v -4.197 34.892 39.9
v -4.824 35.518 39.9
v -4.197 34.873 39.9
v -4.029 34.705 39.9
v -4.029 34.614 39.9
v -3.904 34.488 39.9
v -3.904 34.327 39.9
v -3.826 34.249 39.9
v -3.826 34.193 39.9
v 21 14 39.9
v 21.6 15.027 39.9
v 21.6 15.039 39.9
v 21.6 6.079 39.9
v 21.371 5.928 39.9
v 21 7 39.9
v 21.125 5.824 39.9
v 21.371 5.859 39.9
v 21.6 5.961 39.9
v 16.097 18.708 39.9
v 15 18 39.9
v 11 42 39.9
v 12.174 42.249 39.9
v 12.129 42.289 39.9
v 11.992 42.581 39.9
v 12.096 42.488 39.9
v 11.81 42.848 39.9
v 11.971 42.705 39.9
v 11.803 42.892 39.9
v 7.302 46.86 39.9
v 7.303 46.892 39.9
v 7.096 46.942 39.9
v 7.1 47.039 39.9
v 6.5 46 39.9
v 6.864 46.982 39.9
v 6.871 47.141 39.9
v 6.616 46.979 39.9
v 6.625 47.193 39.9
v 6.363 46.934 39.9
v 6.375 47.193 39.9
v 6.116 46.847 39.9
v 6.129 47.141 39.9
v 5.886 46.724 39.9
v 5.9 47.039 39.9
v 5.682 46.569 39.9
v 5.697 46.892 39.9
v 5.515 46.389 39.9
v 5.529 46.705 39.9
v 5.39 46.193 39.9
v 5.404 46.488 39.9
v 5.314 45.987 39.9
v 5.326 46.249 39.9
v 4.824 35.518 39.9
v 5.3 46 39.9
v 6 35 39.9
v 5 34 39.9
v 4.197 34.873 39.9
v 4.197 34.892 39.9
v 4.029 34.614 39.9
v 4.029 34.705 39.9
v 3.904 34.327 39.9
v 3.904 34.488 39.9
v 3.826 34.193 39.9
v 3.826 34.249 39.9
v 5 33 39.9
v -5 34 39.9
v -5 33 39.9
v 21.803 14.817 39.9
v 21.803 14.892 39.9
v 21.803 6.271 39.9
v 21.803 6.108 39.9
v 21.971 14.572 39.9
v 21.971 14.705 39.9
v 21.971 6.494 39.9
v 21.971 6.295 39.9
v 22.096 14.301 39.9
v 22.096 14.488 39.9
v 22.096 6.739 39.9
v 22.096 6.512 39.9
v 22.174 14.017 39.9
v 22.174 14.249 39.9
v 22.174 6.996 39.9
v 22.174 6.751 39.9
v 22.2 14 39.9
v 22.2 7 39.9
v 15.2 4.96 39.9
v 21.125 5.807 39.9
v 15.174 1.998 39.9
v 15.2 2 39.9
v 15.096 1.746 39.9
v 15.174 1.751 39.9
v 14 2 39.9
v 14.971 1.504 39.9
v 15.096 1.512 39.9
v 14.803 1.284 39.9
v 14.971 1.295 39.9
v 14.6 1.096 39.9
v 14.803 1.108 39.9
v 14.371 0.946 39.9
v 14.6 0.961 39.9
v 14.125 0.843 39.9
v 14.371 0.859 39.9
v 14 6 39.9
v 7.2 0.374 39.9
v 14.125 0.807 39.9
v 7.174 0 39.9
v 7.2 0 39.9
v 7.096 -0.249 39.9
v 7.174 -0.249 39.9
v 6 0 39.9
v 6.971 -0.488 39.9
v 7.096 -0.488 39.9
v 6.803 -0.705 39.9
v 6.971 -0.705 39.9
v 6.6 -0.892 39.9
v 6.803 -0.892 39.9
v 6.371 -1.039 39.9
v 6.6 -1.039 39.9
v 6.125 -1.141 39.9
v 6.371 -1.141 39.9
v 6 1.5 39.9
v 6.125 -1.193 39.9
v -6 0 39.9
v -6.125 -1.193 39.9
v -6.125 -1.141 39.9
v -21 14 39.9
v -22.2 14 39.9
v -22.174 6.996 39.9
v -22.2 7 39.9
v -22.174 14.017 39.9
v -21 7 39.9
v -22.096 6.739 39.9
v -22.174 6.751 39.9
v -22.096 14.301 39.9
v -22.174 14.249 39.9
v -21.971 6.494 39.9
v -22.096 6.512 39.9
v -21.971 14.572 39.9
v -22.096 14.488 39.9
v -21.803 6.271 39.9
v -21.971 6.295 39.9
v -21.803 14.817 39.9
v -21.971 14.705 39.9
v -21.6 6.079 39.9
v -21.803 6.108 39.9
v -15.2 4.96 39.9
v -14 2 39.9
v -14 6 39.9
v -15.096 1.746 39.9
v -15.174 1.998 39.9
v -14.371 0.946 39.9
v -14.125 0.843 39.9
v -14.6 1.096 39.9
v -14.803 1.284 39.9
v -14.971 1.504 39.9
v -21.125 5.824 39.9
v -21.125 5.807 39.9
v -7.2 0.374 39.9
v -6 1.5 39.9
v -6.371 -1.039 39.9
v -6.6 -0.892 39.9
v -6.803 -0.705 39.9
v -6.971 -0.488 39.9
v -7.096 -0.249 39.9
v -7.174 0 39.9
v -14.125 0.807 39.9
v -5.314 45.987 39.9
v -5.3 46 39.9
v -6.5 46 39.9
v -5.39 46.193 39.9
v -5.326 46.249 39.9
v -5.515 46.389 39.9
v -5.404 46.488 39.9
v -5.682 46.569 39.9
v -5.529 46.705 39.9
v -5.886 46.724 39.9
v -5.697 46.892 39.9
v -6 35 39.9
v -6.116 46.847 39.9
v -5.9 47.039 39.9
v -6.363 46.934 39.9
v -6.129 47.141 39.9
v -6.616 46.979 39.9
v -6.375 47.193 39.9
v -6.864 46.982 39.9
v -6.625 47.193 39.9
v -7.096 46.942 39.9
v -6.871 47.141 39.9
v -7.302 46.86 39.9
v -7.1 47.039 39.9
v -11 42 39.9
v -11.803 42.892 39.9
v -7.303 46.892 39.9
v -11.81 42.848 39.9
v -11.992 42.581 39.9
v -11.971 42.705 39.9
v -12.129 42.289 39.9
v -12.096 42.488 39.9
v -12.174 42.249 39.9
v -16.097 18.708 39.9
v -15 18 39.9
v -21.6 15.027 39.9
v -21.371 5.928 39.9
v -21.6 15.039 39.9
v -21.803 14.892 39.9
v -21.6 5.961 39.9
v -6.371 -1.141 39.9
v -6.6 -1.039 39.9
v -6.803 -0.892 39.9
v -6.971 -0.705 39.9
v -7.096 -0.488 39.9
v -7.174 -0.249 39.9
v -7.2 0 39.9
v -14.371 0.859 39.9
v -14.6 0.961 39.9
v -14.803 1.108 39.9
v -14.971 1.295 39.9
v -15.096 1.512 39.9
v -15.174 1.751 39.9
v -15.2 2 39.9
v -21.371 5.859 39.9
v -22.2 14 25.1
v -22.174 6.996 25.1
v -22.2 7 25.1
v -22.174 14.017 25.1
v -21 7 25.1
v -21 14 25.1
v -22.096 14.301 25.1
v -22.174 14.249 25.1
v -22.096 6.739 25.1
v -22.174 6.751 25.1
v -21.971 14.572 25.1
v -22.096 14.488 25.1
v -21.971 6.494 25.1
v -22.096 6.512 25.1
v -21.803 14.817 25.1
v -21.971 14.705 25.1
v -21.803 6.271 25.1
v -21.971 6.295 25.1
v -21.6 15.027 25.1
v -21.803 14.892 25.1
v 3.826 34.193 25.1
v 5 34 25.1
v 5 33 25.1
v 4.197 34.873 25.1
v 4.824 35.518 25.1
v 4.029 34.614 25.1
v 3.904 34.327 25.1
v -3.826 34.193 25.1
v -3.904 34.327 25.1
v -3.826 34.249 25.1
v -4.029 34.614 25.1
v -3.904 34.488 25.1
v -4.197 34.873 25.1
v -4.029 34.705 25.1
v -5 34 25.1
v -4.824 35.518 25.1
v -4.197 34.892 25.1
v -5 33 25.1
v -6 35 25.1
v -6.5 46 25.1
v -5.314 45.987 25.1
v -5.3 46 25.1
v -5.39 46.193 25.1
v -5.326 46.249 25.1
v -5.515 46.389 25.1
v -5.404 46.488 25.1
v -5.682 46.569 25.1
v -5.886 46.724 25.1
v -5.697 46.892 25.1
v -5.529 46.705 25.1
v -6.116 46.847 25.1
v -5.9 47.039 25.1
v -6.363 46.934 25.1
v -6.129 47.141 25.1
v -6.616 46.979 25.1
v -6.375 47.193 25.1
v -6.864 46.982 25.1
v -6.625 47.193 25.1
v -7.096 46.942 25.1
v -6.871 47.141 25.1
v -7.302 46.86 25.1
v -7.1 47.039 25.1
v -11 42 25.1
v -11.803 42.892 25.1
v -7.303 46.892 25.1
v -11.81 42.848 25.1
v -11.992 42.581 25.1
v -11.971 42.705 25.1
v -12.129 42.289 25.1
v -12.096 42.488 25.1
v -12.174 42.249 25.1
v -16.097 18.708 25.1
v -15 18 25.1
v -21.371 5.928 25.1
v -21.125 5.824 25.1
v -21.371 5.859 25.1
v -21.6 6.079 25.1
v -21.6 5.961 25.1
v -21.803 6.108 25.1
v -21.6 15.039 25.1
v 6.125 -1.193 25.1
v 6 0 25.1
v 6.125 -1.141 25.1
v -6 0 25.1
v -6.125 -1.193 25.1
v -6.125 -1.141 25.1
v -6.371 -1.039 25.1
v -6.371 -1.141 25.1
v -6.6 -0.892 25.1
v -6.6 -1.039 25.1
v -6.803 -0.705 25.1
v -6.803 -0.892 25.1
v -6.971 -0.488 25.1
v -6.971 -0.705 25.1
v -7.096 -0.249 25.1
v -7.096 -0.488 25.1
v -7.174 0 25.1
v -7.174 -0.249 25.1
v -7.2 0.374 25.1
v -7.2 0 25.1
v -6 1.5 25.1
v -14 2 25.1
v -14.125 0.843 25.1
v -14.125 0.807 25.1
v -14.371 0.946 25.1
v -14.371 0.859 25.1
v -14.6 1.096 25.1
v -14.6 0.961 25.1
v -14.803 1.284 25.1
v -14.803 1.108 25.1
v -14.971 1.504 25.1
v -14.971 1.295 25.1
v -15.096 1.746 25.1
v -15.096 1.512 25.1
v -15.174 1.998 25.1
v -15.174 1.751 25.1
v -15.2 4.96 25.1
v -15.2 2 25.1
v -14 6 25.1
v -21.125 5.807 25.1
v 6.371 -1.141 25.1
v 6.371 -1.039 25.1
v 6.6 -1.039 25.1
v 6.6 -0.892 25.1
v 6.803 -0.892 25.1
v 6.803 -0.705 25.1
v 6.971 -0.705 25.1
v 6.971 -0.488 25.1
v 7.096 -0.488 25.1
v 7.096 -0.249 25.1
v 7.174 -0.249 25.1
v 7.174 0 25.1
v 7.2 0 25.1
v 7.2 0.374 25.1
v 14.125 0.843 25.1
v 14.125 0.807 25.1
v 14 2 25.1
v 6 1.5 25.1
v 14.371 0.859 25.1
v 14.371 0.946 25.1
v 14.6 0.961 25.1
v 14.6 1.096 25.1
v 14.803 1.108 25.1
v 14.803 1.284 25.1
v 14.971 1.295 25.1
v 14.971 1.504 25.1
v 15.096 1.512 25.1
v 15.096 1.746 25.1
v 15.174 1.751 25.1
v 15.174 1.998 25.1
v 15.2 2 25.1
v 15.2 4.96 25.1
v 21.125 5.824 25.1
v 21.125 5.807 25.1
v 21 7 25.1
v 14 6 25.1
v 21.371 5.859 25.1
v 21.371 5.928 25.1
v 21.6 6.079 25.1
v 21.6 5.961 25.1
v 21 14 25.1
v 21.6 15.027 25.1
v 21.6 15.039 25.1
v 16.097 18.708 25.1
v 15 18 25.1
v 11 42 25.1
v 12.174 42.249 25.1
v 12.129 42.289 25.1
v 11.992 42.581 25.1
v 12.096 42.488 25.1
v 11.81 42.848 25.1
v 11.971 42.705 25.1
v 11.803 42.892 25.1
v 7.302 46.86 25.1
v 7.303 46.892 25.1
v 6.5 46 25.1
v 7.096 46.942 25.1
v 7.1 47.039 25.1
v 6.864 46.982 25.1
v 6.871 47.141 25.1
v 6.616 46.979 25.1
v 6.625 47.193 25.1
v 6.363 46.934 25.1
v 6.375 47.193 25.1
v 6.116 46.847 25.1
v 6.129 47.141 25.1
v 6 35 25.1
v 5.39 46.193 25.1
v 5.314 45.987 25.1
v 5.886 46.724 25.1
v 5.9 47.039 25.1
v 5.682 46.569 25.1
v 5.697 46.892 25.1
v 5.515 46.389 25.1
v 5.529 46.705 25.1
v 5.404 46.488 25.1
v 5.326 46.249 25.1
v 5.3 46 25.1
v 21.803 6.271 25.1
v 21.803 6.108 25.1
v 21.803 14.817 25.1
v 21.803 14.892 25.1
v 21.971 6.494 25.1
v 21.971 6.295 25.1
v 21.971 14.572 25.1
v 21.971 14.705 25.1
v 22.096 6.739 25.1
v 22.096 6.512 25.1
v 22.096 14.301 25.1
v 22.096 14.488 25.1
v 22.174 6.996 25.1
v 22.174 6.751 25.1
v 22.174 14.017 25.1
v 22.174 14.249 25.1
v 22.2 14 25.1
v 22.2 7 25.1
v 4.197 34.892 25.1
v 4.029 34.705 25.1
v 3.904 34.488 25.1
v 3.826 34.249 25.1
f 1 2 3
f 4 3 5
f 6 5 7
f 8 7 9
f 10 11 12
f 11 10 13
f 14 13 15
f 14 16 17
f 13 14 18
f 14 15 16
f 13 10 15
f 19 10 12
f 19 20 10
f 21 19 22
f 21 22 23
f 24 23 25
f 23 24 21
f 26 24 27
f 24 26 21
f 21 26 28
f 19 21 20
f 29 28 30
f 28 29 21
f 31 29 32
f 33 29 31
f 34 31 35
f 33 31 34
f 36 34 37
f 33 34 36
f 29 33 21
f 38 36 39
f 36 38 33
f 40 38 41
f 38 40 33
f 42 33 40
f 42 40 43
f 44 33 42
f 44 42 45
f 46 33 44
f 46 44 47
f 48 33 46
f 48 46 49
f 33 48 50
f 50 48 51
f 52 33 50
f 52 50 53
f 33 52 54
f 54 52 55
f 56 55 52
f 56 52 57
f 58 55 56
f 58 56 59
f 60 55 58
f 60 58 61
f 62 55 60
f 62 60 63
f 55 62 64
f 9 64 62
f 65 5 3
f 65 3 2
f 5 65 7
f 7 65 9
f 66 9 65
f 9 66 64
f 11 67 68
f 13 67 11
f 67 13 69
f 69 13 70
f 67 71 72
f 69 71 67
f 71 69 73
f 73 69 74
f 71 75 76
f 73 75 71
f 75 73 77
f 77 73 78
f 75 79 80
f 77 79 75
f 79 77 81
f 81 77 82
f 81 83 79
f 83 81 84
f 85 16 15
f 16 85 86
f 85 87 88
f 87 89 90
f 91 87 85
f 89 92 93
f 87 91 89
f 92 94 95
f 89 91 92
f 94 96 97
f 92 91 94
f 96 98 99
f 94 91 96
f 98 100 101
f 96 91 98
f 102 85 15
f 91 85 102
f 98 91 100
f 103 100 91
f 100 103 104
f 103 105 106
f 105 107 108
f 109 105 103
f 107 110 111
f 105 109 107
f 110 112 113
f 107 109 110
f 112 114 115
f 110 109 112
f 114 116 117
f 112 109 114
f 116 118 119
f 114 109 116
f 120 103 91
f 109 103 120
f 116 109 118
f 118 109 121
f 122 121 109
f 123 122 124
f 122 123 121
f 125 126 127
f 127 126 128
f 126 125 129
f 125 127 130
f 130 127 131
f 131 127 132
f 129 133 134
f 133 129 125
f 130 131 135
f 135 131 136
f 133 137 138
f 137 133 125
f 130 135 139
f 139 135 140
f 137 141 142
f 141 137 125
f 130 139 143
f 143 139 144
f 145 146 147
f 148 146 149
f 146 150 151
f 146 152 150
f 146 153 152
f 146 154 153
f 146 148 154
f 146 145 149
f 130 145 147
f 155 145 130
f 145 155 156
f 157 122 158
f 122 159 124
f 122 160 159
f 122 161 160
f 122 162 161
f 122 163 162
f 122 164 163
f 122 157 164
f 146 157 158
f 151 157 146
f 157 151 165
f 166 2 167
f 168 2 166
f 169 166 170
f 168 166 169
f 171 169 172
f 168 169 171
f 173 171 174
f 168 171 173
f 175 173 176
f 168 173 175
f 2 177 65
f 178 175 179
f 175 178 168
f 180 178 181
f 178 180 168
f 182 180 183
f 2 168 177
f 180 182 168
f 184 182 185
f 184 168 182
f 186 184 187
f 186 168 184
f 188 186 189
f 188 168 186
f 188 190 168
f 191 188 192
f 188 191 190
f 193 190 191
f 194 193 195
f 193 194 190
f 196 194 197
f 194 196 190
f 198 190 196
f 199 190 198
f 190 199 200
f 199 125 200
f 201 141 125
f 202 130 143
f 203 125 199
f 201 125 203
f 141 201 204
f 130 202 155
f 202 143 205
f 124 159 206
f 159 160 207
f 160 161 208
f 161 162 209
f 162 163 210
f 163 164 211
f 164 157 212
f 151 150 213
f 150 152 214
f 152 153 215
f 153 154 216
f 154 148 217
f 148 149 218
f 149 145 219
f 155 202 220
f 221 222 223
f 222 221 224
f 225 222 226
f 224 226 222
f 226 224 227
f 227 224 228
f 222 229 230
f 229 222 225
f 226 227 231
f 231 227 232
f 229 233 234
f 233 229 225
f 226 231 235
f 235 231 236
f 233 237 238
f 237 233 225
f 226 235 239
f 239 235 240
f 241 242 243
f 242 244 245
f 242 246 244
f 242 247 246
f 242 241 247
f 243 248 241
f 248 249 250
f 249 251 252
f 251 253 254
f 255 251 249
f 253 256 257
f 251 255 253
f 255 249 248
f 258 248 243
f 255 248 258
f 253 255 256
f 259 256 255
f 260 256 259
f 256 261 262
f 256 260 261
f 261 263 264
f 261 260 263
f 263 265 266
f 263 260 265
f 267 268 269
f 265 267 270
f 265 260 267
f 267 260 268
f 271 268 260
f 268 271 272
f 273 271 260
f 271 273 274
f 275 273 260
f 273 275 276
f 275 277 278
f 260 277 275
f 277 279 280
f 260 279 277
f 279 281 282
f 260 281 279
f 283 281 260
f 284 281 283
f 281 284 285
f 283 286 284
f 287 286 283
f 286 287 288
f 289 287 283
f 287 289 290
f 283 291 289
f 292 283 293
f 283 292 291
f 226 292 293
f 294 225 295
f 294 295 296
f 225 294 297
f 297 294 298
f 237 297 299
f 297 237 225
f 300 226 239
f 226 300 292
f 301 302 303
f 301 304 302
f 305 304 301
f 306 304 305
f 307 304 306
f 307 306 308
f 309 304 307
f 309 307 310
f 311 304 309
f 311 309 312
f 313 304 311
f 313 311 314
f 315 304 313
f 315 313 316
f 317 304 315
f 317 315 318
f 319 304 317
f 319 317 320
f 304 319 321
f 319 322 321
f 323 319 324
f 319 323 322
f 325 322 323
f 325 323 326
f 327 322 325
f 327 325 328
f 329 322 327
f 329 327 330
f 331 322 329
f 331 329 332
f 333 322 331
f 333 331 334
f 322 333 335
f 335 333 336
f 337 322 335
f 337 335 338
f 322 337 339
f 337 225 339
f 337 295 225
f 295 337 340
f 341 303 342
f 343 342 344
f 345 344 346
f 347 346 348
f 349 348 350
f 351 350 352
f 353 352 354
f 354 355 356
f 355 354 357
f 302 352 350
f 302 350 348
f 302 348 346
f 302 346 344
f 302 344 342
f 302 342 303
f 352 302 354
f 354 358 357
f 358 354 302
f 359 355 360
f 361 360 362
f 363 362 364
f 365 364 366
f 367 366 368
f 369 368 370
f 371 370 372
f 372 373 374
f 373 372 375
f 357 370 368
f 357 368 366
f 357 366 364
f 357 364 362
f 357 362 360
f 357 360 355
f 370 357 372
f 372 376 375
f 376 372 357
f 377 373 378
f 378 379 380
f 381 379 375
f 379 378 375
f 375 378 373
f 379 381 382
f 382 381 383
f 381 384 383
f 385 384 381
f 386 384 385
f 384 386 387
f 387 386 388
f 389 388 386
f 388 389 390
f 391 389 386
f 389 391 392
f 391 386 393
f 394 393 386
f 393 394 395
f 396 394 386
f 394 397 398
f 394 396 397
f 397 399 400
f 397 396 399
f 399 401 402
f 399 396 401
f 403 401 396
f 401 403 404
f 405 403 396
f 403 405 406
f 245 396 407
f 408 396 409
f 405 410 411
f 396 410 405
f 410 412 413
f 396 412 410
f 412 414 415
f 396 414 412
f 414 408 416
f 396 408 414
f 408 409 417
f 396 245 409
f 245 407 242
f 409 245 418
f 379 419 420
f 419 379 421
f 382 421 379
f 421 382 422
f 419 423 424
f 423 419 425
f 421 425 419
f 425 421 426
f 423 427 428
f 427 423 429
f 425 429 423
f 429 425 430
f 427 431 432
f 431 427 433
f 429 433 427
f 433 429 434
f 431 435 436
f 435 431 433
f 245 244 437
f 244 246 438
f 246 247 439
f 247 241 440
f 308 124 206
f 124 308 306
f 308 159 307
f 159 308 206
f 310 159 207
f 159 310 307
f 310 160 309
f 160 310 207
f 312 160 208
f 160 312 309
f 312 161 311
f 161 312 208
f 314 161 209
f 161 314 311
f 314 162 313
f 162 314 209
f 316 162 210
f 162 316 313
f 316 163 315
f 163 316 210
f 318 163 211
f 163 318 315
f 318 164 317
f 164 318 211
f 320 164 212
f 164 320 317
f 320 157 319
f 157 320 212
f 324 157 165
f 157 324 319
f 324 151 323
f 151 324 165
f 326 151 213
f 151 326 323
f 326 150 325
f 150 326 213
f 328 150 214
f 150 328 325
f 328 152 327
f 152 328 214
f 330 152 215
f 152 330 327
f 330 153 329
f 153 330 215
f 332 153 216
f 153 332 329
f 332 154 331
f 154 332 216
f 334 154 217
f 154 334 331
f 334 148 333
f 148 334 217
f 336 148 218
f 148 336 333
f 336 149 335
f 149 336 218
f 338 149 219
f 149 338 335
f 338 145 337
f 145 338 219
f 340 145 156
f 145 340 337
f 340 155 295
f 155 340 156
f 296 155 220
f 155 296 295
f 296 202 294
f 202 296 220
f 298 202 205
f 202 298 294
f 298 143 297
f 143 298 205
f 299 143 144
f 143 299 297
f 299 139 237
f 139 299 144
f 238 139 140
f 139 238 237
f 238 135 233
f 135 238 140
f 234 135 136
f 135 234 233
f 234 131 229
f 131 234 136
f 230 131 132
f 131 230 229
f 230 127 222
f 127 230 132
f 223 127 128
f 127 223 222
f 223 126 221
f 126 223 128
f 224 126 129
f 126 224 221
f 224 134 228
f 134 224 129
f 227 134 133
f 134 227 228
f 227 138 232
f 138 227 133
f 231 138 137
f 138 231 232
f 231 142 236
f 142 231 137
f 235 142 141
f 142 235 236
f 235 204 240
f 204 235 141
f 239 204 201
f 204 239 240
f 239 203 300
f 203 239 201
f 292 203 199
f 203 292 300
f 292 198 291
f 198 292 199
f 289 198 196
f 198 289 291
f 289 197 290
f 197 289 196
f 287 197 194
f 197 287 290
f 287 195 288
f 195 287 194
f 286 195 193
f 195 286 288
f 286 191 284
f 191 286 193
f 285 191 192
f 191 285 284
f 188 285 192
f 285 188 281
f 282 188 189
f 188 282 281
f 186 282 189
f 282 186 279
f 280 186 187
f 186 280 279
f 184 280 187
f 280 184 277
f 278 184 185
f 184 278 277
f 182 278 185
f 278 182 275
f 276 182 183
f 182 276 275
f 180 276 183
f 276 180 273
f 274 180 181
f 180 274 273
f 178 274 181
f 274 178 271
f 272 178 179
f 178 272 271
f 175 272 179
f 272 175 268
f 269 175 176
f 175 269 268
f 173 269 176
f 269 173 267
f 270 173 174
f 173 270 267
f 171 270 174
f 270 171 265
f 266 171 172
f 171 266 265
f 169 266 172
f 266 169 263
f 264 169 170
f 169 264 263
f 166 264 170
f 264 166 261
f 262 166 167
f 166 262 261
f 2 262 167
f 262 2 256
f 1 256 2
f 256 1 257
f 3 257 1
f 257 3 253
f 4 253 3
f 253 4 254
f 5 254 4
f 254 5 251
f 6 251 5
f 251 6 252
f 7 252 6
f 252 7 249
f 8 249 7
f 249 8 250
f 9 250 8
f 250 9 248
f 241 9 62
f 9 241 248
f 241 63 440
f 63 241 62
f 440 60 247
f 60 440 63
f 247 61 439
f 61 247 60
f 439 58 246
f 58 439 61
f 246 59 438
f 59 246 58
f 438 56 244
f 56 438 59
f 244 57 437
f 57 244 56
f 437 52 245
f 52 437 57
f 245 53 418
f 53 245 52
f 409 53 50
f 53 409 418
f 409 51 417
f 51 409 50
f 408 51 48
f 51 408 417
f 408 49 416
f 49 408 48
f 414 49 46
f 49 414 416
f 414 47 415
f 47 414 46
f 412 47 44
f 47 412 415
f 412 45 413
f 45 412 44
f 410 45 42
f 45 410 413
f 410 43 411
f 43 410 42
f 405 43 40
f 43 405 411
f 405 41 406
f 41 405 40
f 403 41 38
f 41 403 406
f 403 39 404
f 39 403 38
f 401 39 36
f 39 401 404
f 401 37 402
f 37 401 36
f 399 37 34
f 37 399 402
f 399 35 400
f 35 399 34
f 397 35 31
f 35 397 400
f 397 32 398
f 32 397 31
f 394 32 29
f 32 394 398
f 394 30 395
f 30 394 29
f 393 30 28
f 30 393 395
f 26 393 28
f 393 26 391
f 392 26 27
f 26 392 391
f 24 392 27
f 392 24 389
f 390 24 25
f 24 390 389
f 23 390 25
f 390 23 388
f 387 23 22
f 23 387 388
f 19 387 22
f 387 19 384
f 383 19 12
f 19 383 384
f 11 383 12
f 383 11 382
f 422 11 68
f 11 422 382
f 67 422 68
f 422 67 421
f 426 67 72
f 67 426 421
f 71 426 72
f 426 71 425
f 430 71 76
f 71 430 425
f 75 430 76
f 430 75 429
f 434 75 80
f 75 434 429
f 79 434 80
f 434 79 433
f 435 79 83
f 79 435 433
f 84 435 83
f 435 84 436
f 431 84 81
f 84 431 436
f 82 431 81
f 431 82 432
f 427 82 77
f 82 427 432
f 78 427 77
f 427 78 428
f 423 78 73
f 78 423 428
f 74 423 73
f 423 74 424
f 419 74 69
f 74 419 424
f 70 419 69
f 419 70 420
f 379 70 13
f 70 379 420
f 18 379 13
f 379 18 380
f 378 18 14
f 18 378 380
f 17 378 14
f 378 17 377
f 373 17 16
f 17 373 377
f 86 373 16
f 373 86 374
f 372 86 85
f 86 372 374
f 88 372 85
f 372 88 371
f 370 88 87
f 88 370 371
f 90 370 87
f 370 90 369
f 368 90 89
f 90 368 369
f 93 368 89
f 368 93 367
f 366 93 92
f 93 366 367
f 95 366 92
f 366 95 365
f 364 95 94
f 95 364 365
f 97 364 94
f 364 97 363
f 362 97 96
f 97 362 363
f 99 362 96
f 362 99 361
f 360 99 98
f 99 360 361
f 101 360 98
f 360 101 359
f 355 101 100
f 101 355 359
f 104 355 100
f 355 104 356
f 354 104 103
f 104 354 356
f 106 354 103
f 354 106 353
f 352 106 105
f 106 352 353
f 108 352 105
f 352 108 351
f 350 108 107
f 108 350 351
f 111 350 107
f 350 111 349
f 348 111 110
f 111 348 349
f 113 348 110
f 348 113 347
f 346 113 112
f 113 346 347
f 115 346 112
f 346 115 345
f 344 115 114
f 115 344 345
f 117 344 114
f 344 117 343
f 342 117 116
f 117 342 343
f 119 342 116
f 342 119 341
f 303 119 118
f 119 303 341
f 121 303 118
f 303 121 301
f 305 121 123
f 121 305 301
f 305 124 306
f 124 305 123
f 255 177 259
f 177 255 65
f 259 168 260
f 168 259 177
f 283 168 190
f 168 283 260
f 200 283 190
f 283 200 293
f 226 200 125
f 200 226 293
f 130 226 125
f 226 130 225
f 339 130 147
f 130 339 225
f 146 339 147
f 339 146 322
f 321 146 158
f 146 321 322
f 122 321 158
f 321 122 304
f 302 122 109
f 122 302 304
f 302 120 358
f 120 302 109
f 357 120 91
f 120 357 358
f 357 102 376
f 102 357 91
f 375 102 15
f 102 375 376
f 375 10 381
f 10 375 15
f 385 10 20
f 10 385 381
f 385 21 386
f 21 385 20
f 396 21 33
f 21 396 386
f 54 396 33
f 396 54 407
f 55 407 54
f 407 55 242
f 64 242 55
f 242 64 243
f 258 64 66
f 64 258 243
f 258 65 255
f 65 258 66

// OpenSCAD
/* protectorate-bin.scad
 *
 * Copyright (C) Robert B. Ross, 2016
 *
 * This software is released under the Creative Commons
 * Attribution-ShareAlike 4.0 International Public License.
 */

include <./bintools.scad>

$fn=160;
binHeight   = 46.5/2;
angle=0;

/* locations is a pair of triples, translate : rotate pairs
 */
locations = [[[1,28.5,0], [0,0,-30]],
             [[-1,-28.5,0], [0,0,150]]];

// harborFreightMediumHalfHt(locations,inset=1) protBlank();

// protBlank();
protOutline();

/* protOutline() -- test piece for outline
 */
module protOutline() {
   translate([0,0,40]) rotate([180,0,0]) {
      blankCutout(height=15 - 0.1, outlineScale=1.2) protBlank();
   }
}

module protBlank(centerCutout=0) {
   blankHeight = 28.5; 
   
   /* rotate, etc. positions blank upside-down on XY plane */
   rotate([180,0,0]) translate([0,0,-binHeight]) union() {
      difference() {
         translate([0,0,binHeight-blankHeight])
            linear_extrude(height=blankHeight) protShell();
      }
      if (centerCutout) linear_extrude(height=binHeight) protCutoutPoly();
   } /* rotate, translate, union */
}

/* protShell() -- exterior outline */
module protShell() {
   for (j=[0:1]) mirror([j,0,0])
      polygon(points=[
                     [-0.1,0], [6,0], [6,1.5], [14,2], [14,6], [21,7],
                     [21,14], [15,18], [11,42], [6.5,46], [6,35], [5,34],
                     [5,33], [-0.1,33]
                     ]);
}

/* protCutoutPoly() -- defines a polygon to be cut all the way to the
 *                     bottom of the bin.
 *
 */
module protCutoutPoly() {
   for (j=[0:1]) mirror([j,0,0])
      polygon(points=[[-0.1,-0.1], [9.5,-0.1], [9.5,5.16], [14.64,6.23],
                      [14.64,13],[19.85,12.1],[22,17.05],// [19.7,23.41],
                      // [19.6,33.5], [19.6,37], [14.95,37], [14.95,33.5],
                      // [11.07,22.93],
                     [9.9,22.93], [9.5,25],[-0.1,25]]);
}

/*
 * Local variables:
 *  mode: C
 *  c-indent-level: 3
 *  c-basic-offset: 3
 * End:
 *
 * vim: ts=8 sts=3 sw=3 expandtab
 */
